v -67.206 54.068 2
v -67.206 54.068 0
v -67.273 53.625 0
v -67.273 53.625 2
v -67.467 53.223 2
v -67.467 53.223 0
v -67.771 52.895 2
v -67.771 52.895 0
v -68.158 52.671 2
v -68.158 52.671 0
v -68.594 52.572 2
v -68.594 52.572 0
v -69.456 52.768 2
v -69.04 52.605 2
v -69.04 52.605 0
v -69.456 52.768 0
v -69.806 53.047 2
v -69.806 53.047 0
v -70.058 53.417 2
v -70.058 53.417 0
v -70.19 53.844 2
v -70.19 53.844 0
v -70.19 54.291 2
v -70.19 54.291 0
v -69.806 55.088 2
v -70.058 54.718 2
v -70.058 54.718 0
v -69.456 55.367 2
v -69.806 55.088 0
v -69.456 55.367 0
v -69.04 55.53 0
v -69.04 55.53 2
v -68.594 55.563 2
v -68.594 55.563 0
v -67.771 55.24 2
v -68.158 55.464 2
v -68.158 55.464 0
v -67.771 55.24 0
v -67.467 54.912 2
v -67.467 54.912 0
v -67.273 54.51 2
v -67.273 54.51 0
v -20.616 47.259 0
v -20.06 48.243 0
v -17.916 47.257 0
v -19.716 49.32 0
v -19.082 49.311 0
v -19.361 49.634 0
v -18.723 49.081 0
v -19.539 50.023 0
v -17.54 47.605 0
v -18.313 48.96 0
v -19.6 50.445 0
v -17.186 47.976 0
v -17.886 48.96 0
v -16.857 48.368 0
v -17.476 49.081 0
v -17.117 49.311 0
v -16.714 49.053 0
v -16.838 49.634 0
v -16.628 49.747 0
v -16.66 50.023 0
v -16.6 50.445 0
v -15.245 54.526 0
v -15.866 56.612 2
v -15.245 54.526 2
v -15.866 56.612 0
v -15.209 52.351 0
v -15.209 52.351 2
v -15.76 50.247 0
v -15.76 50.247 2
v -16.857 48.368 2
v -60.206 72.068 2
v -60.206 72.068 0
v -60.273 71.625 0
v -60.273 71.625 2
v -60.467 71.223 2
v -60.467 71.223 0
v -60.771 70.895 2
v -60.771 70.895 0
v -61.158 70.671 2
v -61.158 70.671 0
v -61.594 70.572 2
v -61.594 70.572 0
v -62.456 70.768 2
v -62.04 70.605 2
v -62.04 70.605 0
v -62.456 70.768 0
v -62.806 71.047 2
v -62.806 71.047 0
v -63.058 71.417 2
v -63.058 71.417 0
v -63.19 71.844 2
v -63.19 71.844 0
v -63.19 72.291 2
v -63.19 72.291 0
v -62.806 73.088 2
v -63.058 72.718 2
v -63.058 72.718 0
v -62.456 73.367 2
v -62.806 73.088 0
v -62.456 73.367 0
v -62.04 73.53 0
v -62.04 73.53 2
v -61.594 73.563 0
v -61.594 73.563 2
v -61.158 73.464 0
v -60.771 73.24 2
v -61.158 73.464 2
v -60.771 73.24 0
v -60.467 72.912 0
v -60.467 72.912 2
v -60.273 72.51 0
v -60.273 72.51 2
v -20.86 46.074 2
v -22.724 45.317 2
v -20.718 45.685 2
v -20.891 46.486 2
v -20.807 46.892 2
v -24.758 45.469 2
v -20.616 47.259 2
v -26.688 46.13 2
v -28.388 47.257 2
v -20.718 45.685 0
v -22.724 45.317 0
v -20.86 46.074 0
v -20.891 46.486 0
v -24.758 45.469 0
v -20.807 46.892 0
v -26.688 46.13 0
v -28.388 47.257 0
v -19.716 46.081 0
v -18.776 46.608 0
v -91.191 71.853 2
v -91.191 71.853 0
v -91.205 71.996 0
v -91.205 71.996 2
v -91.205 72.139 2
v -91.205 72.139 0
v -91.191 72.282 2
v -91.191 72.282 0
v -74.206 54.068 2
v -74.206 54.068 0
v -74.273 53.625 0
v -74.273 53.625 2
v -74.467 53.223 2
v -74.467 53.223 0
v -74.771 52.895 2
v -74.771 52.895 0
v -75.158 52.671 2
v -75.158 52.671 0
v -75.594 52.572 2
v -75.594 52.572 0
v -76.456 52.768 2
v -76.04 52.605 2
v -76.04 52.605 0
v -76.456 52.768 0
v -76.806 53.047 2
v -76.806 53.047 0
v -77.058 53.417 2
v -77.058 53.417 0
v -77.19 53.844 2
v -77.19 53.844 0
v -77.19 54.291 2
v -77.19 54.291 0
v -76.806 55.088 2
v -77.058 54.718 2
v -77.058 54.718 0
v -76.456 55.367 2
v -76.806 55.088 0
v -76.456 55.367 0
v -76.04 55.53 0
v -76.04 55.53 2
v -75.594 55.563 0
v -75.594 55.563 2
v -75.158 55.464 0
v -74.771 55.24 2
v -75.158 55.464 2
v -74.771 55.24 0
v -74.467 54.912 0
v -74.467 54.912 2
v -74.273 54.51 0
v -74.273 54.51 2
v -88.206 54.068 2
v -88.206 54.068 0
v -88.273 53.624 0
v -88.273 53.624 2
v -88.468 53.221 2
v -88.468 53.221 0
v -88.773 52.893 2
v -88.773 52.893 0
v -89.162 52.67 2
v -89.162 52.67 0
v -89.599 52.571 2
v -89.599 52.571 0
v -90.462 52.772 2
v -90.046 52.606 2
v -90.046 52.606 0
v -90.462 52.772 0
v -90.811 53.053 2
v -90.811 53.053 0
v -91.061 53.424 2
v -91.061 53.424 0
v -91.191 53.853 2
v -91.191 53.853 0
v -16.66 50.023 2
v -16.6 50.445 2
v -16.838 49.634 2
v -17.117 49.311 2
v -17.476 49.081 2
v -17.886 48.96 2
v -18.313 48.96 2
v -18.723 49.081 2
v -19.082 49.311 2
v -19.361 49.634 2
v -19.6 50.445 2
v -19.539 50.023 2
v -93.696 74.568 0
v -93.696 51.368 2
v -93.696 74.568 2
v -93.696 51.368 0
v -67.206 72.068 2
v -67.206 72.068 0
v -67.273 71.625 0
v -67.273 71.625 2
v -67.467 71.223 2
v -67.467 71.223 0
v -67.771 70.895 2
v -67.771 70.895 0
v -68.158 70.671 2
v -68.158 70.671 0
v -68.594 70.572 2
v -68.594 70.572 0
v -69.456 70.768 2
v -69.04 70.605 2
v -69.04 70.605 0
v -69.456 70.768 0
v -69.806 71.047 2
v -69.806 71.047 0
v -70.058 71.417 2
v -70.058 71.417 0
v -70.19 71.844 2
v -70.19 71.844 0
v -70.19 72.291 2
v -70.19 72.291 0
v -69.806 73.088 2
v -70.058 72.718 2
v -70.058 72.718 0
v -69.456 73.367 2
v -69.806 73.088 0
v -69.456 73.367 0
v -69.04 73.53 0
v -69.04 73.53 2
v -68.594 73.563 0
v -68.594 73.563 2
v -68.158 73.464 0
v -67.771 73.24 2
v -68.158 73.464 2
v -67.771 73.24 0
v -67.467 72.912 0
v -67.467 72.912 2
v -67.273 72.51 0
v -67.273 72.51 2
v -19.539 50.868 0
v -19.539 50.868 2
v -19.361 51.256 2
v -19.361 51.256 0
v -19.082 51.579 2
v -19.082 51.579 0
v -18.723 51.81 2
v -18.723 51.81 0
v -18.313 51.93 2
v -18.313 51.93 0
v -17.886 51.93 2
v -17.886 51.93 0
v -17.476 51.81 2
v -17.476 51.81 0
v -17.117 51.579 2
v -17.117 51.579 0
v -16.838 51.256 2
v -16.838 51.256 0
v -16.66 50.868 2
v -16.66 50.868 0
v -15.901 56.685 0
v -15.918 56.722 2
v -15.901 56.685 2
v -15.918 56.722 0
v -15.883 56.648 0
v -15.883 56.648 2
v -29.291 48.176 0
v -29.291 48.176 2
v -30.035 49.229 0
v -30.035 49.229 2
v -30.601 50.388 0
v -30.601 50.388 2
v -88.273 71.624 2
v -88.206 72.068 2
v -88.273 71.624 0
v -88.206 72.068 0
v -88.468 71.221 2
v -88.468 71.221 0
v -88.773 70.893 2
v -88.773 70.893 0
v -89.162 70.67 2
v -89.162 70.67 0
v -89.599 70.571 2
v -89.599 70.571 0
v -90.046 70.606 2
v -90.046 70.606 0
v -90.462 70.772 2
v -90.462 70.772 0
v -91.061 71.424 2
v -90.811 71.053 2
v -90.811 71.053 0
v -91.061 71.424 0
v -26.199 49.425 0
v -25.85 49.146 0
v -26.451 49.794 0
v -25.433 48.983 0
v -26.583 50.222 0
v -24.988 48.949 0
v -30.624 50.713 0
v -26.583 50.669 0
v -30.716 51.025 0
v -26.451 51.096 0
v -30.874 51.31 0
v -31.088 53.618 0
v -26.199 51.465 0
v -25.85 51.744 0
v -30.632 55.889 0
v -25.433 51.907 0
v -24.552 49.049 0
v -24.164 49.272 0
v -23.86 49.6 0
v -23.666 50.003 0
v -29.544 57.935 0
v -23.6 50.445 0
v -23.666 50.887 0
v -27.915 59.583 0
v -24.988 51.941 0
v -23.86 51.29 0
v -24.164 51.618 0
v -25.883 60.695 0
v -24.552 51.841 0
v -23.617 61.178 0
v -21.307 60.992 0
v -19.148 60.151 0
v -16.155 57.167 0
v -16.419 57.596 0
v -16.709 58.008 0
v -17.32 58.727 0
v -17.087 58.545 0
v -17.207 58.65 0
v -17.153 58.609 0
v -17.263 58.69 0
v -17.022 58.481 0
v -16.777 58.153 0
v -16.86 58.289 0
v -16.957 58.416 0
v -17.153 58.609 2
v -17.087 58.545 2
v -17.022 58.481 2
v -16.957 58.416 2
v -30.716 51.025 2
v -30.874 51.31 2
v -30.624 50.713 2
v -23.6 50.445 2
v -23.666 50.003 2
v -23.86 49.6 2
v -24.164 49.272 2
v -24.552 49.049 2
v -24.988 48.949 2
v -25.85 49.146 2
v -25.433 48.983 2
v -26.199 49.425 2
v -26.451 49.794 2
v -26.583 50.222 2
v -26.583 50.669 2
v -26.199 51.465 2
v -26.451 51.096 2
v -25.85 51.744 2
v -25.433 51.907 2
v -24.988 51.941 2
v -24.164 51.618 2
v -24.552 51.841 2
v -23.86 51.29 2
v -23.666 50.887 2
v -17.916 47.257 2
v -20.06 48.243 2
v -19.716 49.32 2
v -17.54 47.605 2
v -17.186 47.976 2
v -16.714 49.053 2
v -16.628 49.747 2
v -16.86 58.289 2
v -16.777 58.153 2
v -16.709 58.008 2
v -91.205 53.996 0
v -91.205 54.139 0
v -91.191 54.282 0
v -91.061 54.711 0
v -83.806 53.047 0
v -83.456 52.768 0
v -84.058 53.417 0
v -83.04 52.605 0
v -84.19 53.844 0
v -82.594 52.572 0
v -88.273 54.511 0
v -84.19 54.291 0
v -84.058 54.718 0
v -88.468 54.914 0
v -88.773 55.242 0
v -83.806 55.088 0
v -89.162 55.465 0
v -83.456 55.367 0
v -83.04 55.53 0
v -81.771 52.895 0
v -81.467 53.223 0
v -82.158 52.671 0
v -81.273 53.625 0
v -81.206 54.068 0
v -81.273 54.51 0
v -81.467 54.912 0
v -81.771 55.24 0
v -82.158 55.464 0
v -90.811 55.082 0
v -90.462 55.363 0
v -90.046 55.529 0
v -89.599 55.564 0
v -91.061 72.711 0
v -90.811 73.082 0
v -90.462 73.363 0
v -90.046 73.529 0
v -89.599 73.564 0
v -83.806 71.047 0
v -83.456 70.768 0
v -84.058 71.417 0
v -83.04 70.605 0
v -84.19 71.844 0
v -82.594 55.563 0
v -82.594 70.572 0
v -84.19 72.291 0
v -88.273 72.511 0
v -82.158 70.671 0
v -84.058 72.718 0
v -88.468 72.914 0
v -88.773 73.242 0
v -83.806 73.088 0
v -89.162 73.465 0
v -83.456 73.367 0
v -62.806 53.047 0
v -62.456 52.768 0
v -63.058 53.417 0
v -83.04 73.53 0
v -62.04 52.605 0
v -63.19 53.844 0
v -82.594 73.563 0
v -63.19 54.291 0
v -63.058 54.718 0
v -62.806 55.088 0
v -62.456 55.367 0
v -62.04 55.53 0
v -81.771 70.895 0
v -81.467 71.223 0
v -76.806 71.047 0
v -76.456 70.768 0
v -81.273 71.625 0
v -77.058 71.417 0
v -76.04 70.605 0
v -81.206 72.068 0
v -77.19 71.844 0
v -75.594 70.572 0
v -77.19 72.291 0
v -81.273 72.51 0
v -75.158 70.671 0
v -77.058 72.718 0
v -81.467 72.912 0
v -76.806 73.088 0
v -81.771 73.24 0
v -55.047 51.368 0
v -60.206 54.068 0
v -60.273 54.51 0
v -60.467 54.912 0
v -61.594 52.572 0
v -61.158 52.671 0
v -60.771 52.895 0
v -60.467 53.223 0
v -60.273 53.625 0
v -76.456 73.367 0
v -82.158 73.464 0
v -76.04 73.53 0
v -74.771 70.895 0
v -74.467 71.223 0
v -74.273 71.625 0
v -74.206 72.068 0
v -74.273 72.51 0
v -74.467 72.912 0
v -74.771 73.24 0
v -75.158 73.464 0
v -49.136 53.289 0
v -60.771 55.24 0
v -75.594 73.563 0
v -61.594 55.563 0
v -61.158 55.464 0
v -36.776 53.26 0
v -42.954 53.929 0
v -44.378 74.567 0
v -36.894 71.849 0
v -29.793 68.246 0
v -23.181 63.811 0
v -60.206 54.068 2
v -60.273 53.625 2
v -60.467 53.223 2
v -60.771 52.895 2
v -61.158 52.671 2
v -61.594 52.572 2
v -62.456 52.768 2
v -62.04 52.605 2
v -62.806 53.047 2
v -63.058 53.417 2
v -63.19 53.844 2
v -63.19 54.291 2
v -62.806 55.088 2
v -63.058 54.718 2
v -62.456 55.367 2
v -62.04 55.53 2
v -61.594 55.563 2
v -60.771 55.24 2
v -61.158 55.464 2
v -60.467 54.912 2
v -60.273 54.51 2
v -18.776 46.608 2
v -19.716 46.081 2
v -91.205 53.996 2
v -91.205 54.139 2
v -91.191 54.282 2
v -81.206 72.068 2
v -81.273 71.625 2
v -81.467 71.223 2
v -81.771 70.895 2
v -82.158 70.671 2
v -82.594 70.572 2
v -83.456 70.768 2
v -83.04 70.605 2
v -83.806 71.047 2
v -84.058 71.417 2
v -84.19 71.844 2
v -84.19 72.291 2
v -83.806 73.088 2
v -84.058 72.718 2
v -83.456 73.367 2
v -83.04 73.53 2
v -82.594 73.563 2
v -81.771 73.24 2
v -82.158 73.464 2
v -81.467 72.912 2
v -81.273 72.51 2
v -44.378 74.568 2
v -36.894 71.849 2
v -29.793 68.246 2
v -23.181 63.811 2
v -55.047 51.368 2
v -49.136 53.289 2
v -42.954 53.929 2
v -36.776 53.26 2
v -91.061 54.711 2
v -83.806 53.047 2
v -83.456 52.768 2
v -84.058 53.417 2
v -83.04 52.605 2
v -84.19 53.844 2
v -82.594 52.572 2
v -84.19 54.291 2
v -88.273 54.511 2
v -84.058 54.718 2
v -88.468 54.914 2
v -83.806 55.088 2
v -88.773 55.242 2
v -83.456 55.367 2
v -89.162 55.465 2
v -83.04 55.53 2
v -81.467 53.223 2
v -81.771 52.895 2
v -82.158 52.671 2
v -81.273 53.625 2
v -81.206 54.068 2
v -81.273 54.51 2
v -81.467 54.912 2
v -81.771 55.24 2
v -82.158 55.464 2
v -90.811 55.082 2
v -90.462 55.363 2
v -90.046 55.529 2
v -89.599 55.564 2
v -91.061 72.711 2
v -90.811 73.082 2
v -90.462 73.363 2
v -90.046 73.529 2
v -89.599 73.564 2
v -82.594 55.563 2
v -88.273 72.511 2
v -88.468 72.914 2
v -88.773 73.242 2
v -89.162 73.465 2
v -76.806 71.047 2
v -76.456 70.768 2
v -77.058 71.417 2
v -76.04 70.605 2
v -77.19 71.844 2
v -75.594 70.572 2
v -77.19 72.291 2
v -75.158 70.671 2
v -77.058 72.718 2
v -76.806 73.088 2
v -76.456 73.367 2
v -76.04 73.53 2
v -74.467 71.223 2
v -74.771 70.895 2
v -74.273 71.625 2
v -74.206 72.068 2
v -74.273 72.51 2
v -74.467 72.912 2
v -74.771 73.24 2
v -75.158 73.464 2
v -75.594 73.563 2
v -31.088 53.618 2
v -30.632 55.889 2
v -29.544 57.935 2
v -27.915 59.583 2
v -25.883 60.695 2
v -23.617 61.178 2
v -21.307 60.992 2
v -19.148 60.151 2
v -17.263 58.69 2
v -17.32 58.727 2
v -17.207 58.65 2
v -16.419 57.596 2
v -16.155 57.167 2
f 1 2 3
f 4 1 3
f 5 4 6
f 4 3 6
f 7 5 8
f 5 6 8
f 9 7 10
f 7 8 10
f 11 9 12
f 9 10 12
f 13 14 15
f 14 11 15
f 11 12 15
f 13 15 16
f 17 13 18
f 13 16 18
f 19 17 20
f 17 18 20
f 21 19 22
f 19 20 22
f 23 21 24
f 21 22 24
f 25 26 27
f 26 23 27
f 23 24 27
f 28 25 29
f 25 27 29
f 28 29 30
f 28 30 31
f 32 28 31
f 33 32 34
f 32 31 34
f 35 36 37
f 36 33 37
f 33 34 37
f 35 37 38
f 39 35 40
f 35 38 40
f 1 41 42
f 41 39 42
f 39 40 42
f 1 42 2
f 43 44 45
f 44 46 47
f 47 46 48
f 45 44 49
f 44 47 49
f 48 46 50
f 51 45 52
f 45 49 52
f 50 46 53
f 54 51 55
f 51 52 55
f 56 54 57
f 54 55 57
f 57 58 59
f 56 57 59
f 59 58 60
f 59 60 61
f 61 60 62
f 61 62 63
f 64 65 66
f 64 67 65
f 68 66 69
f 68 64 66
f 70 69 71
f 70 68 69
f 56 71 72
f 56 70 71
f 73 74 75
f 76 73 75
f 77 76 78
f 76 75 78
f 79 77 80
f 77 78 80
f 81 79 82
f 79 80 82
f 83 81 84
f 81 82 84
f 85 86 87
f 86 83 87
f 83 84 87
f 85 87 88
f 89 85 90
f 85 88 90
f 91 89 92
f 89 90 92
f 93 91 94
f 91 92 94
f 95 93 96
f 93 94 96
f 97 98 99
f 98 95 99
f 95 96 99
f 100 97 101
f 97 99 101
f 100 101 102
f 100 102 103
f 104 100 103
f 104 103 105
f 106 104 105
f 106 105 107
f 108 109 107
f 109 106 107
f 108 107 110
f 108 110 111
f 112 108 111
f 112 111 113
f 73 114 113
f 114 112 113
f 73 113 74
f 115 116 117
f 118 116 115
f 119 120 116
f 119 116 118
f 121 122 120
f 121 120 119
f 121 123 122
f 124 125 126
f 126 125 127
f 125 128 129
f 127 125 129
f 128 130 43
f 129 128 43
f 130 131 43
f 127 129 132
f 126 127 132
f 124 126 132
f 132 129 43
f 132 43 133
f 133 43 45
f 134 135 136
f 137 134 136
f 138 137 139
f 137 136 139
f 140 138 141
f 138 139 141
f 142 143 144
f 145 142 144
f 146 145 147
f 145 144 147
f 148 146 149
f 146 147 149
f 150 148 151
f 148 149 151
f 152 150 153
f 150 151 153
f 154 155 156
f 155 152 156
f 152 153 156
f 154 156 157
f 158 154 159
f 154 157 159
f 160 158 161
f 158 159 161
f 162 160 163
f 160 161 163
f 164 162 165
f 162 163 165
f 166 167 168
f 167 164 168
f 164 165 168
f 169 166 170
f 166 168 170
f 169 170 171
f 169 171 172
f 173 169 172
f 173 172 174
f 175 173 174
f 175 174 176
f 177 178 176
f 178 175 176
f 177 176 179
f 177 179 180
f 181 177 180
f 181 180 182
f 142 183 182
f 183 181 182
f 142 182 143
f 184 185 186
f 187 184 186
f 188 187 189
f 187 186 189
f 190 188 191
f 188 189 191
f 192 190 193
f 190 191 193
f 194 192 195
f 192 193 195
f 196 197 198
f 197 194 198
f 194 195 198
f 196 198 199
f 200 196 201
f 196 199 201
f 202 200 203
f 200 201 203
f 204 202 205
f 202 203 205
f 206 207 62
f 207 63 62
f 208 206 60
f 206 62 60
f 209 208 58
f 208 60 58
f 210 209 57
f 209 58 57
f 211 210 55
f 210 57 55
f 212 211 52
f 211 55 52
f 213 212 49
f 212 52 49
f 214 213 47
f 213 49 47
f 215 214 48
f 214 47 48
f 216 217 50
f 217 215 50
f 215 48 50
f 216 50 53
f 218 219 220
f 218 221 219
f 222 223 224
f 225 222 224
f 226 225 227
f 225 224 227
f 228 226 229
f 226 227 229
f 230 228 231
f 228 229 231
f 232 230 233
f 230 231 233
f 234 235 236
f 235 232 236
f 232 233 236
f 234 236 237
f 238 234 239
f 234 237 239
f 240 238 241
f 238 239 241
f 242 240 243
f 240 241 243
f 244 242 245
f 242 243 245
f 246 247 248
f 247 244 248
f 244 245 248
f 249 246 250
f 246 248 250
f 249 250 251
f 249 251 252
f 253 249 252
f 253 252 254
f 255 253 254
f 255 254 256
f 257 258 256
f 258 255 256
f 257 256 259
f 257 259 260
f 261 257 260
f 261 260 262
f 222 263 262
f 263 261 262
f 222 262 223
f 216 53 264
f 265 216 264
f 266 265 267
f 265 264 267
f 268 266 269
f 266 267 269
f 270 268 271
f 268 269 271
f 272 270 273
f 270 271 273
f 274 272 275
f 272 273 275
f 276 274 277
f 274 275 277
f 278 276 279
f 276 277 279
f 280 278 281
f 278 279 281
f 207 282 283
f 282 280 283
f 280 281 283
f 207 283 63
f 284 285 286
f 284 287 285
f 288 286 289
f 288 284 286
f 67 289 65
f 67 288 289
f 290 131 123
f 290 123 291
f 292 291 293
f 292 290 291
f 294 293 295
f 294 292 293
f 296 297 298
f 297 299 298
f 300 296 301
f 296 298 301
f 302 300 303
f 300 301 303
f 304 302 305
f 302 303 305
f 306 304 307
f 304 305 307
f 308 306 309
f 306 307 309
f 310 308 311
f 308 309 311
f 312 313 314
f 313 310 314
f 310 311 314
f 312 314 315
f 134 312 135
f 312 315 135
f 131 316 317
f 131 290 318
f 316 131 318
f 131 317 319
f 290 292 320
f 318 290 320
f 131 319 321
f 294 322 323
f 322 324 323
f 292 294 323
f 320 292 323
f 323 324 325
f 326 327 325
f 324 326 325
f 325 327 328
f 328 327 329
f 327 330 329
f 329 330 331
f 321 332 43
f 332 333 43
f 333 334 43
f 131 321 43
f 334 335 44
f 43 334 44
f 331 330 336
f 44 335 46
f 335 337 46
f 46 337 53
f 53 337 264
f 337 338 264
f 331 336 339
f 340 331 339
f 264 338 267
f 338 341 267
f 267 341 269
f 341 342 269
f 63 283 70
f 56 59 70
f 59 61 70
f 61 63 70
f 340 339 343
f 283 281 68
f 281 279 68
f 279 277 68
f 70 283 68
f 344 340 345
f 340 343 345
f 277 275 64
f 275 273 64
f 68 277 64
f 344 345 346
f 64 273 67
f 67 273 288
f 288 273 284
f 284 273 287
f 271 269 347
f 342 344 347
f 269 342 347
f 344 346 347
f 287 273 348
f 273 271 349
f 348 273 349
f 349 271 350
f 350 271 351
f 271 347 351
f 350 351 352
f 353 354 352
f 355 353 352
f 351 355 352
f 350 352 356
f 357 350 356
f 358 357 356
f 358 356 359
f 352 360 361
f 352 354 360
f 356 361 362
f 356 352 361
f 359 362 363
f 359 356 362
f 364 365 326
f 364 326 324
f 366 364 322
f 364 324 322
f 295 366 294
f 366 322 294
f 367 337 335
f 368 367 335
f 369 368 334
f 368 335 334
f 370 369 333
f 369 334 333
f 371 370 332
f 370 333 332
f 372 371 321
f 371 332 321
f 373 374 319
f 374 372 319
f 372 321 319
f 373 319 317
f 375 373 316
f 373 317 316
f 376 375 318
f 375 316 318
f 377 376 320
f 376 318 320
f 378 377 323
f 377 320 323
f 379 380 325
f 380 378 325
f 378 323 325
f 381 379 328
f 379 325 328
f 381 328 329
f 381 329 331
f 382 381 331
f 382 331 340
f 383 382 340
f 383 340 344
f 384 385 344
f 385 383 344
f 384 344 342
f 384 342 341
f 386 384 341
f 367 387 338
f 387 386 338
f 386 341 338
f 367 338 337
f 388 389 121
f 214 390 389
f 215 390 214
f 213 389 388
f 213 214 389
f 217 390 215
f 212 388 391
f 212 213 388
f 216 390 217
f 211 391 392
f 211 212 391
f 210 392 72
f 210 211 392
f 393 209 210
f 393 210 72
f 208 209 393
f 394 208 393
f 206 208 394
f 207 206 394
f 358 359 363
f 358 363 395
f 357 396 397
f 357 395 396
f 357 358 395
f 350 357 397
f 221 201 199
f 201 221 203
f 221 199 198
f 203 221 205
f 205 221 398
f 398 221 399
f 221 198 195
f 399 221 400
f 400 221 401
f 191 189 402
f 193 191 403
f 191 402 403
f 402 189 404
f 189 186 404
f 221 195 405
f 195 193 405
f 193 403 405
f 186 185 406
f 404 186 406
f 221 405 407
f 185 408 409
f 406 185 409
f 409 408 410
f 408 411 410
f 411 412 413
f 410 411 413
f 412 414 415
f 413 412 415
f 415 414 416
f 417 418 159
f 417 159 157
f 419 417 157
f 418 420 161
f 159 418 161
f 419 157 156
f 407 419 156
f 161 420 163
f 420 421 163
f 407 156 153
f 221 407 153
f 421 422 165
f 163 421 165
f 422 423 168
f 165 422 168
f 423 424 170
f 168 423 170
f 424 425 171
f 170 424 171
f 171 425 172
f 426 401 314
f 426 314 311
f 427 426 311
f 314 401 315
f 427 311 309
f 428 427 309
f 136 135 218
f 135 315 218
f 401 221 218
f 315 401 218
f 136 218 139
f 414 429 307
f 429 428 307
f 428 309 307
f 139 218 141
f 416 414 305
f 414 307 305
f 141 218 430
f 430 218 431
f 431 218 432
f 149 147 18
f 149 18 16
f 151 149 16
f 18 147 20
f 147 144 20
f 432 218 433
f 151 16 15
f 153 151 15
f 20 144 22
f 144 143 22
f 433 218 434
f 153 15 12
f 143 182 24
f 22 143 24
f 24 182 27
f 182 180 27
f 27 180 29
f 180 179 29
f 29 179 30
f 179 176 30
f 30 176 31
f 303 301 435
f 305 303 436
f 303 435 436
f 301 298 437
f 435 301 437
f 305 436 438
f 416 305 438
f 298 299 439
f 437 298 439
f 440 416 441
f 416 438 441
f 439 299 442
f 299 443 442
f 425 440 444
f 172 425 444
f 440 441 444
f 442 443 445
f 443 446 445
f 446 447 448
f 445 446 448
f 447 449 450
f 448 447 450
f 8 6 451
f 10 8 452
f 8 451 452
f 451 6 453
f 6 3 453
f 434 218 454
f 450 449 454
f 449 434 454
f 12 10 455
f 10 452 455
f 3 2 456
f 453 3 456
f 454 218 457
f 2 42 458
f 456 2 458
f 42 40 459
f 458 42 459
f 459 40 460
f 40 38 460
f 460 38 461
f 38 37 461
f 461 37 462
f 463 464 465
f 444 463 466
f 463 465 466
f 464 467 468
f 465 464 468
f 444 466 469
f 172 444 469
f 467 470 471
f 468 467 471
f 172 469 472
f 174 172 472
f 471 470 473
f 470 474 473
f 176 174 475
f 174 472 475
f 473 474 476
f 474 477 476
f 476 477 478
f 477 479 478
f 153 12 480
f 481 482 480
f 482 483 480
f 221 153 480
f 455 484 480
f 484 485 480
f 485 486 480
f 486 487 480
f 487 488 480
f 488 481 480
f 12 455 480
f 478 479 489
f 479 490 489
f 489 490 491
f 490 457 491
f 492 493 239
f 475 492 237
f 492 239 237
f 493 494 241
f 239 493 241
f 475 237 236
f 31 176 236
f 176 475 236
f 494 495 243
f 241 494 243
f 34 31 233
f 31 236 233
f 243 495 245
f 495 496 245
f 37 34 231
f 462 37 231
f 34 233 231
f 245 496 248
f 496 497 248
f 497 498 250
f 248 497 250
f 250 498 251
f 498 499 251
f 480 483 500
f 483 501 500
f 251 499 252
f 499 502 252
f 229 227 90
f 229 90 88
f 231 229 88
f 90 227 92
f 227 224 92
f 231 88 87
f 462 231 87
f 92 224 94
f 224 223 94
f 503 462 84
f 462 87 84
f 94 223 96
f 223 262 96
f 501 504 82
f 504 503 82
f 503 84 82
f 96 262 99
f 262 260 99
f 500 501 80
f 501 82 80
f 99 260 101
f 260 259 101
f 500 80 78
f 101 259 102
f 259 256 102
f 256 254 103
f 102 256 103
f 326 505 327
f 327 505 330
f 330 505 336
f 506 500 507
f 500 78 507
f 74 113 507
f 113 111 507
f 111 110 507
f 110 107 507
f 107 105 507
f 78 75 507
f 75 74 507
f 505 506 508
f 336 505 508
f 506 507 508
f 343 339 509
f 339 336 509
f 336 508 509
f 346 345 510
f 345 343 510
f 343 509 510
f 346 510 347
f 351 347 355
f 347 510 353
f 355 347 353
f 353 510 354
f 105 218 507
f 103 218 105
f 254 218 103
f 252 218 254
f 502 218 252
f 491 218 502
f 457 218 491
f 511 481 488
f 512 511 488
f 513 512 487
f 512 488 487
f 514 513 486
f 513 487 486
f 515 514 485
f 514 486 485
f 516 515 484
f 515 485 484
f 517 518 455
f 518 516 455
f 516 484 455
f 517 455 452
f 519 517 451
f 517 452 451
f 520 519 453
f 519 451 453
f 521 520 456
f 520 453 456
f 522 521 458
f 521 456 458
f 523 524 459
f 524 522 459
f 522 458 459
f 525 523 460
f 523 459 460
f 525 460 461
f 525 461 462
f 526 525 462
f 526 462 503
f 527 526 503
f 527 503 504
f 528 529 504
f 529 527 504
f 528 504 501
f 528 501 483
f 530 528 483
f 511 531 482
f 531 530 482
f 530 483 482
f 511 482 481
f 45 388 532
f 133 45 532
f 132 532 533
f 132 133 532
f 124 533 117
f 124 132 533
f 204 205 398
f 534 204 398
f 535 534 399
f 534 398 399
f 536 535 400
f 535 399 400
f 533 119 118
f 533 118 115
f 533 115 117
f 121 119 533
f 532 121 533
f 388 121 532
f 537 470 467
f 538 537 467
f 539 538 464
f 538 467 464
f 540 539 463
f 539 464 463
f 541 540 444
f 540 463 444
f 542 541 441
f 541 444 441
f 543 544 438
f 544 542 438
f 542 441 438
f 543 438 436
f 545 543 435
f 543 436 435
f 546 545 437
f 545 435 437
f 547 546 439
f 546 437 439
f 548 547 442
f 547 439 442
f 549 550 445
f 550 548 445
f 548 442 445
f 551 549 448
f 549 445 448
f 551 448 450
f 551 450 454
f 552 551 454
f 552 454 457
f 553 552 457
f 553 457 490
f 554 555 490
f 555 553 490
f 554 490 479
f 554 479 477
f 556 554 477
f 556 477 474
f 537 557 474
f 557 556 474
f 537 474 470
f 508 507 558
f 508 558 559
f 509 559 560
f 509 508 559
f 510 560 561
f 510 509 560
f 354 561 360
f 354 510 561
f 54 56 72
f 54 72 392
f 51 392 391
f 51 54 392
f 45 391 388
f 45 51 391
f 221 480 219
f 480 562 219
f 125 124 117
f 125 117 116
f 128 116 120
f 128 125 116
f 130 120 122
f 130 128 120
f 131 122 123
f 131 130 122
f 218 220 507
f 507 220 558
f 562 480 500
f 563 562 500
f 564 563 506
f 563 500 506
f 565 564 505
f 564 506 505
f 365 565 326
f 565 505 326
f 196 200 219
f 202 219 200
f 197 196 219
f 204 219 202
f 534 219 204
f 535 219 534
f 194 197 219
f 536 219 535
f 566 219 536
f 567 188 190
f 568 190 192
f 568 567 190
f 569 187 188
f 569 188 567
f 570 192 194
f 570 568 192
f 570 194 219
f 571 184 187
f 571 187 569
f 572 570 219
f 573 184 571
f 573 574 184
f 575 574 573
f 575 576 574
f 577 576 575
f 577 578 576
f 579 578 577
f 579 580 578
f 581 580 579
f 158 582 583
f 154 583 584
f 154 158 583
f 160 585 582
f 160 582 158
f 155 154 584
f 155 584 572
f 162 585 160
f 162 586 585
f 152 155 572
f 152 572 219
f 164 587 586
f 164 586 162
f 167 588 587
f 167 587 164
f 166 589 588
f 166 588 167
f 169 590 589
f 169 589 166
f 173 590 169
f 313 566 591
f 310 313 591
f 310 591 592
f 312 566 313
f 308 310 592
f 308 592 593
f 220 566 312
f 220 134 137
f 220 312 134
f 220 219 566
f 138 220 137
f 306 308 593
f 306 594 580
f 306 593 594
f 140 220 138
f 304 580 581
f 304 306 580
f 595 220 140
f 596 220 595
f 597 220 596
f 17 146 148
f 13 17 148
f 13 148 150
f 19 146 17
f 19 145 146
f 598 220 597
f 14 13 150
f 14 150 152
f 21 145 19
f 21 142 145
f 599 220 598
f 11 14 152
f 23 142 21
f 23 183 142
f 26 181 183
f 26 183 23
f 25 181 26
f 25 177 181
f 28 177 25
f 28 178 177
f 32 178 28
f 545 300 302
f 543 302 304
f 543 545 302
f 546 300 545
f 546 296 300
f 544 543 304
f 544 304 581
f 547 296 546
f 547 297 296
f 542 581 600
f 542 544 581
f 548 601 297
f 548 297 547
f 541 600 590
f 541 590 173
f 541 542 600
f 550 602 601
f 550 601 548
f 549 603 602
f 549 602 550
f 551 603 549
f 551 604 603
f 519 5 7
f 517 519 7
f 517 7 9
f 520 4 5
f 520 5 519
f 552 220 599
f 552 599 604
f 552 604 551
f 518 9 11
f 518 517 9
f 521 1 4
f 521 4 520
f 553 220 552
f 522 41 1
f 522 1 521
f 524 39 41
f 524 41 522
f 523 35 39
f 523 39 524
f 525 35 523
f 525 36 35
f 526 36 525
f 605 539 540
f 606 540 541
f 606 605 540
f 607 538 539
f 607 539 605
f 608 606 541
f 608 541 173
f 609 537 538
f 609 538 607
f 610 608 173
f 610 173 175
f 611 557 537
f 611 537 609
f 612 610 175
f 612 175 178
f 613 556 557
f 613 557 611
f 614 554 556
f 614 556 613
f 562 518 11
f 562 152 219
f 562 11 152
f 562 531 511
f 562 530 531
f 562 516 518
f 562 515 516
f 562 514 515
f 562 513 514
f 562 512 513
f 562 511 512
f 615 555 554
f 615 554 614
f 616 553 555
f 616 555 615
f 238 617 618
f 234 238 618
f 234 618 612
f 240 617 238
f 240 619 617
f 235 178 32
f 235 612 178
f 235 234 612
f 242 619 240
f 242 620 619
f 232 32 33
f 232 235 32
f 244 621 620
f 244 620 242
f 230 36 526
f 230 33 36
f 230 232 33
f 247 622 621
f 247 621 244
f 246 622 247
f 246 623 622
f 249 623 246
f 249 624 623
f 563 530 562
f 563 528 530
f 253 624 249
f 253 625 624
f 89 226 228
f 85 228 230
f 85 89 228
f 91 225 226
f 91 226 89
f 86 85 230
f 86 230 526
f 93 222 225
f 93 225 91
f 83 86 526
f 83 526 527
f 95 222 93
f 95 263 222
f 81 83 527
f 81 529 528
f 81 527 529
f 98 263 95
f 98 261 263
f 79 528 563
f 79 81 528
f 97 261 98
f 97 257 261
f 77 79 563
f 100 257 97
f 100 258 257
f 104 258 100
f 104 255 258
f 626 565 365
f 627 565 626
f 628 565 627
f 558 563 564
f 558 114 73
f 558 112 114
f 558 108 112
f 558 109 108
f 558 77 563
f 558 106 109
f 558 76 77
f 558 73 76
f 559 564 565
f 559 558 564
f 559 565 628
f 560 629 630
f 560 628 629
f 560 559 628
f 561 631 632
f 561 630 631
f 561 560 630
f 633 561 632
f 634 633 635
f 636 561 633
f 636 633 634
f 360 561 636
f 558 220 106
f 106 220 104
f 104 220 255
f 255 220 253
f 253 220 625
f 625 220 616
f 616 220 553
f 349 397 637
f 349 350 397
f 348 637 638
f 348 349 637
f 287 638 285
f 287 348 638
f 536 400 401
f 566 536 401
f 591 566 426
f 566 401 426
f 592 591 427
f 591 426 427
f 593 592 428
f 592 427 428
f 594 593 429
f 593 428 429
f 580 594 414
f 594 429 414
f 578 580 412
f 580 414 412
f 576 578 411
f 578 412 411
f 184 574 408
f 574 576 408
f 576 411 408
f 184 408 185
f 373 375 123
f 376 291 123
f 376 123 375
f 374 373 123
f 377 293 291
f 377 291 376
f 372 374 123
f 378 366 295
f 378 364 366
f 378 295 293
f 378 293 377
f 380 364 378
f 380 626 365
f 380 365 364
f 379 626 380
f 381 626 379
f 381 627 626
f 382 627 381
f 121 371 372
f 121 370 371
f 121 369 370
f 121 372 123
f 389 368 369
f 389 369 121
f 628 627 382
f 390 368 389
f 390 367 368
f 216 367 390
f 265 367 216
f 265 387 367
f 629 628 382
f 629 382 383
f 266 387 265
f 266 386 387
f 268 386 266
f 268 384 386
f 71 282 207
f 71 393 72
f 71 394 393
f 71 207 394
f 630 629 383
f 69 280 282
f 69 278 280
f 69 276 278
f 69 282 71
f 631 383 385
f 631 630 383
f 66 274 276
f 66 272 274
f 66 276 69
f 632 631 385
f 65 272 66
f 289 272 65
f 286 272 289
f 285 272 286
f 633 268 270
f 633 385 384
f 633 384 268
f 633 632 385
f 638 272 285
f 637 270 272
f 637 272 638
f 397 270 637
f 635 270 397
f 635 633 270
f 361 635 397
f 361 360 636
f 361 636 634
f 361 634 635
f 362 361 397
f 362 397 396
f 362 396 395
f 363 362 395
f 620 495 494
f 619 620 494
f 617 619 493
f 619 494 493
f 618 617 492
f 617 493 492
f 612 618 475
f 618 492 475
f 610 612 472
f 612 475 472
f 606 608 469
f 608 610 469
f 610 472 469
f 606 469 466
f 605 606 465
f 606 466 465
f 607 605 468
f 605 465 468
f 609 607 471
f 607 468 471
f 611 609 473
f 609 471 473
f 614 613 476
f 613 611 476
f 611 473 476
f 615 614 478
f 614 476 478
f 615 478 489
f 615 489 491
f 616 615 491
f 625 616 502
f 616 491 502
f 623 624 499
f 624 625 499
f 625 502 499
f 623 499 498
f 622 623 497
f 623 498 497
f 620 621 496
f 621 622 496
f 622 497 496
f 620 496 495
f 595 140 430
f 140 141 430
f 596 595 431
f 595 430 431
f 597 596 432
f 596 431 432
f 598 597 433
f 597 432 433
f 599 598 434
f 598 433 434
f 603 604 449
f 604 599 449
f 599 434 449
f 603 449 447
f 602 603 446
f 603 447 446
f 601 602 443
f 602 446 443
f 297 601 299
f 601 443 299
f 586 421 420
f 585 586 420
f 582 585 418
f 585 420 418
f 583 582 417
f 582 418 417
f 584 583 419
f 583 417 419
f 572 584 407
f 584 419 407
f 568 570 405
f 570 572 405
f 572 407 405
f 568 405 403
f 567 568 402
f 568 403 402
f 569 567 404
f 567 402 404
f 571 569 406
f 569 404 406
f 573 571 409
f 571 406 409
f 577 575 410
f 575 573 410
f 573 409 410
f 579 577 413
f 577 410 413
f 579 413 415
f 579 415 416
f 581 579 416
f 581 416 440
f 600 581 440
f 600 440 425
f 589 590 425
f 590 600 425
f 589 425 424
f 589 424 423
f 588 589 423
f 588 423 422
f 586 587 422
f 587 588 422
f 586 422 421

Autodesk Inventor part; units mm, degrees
ref_plane "YZ Plane" through (0, 0, 0) normal (1, 0, 0) x (0, 1, 0)
ref_plane "XZ Plane" through (0, 0, 0) normal (0, 1, 0) x (-1, 0, 0)
ref_plane "XY Plane" through (0, 0, 0) normal (0, 0, 1) x (1, 0, 0)
ref_plane "РабПлоскость1" through (0, 0, 0) normal (0, 0, 1) x (1, 0, 0)
sketch "Эскиз1" plane through (0, 0, 0) normal (0, 0, 1) x (1, 0, 0)
  line L0 (-3.6964, 47.257) -> (-93.6964, 47.257)
  line L1 (-93.6964, 47.257) -> (-93.6964, 77.257)
  line L2 (-93.6964, 77.257) -> (-3.6964, 77.257)
  line L3 (-3.6964, 77.257) -> (-3.6964, 47.257)
  circle A0 centre (-25.0996, 50.4451) radius 1.5 projected
  circle A1 centre (-61.7063, 54.0675) radius 1.5
  circle A2 centre (-68.7063, 54.0675) radius 1.5
  circle A3 centre (-75.7063, 54.0675) radius 1.5
  circle A4 centre (-82.7063, 54.0675) radius 1.5
  circle A5 centre (-89.7063, 54.0675) radius 1.5
  circle A6 centre (-61.7063, 72.0675) radius 1.5
  circle A7 centre (-68.7063, 72.0675) radius 1.5
  circle A8 centre (-75.7063, 72.0675) radius 1.5
  circle A9 centre (-82.7063, 72.0675) radius 1.5
  circle A10 centre (-89.7063, 72.0675) radius 1.5
  circle A11 centre (-5.0903, 22.9004) radius 1.5 projected
  circle A12 centre (-13.6314, 40.9849) radius 1.5 projected
  circle A13 centre (-0.8198, 13.8581) radius 1.5 projected
  circle A14 centre (3.4507, 4.8159) radius 1.5 projected
  circle A15 centre (11.9918, -13.2686) radius 1.5 projected
  circle A16 centre (-9.3609, 31.9427) radius 1.5 projected
  circle A17 centre (16.2623, -22.3109) radius 1.5 projected
  circle A18 centre (-9.4594, 1.6491) radius 1.5 projected
  circle A19 centre (-3.3563, -17.3969) radius 1.5 projected
  circle A20 centre (-18.6141, 30.2182) radius 1.5 projected
  circle A21 centre (-12.511, 11.1722) radius 1.5 projected
  circle A22 centre (-15.5626, 20.6952) radius 1.5 projected
  circle A23 centre (-21.6657, 39.7412) radius 1.5 projected
  circle A24 centre (-6.4079, -7.8739) radius 1.5 projected
  circle A25 centre (-0.3048, -26.9199) radius 1.5 projected
  arc A26 (1.815, -50.7724) -> (29.663, -39.7893) centre (16.0996, -46.1951) ccw projected
  line L4 (29.663, -39.7893) -> (-15.8657, 56.6115) projected
  arc A27 (-15.8657, 56.6115) -> (-16.7091, 58.0078) centre (-23.0996, 53.1951) ccw projected
  arc A28 (-16.7091, 58.0078) -> (-17.3202, 58.7267) centre (-18.0996, 57.4451) ccw projected
  arc A29 (-17.3202, 58.7267) -> (-30.8744, 51.3105) centre (-23.0996, 53.1951) ccw projected
  arc A30 (-30.6007, 50.3877) -> (-30.8744, 51.3105) centre (-32.0996, 50.4451) ccw projected
  line L5 (-30.6007, 50.3877) -> (1.815, -50.7724) projected
  circle A31 centre (25.6634, -44.4774) radius 1.5 projected
  circle A32 centre (5.6634, -44.4774) radius 1.5 projected
  circle A33 centre (-25.0996, 50.4451) radius 1.5 projected
  arc A34 (-16.9566, 58.4165) -> (-61.7063, 77.257) centre (-63.0326, 11.5423) ccw
  arc A35 (-30.8744, 51.3105) -> (-61.7063, 47.257) centre (-43.024, 24.4392) ccw
  arc A36 (-30.6007, 50.3877) -> (-15.918, 56.7222) centre (-23.1518, 53.3058) ccw
  arc A37 (-16.5996, 50.4451) -> (-19.5996, 50.4451) centre (-18.0996, 50.4451) ccw projected
  arc A38 (-18.1711, 45.521) -> (-16.5996, 50.4451) centre (-25.0996, 50.4451) ccw projected
  arc A39 (-20.6164, 47.2589) -> (-18.1711, 45.521) centre (-19.3937, 46.39) ccw projected
  arc A40 (-20.6164, 47.2589) -> (-19.5996, 50.4451) centre (-25.0996, 50.4451) ccw projected
  arc A41 (-16.5996, 50.4451) -> (-19.5996, 50.4451) centre (-18.0996, 50.4451) ccw projected
  arc A42 (6.296, -11.0397) -> (4.5608, -0.7256) centre (-6.4079, -7.8739) ccw projected
  arc A43 (7.0742, 0.9124) -> (4.5608, -0.7256) centre (5.8175, 0.0934) ccw projected
  arc A44 (9.207, -11.7651) -> (7.0742, 0.9124) centre (-6.4079, -7.8739) ccw projected
  arc A45 (6.296, -11.0397) -> (9.207, -11.7651) centre (7.7515, -11.4024) ccw projected
  circle A46 centre (-18.0996, 50.4451) radius 1.5
  point P0 (0, 0)
  point P1 (-15.8921, 56.6667)
  point P2 (-19.5996, 50.4451)
  dimension "d0" = 90
  dimension "d1" = 30
  dimension "d2" = 3
  dimension "d5" = 7
  dimension "d8" = 18
extrude "Выдавливание1" add sketch "Эскиз1" along normal blind 2 contours L0 L1 L2 A34 A28 A29 A35 | A29 A28 A34 A27 A36 A38 A37 A40 L0 A30 | L0 A39 A36 | A40 A46 A38 A36 L0 | L0 A36 A39
sketch "Эскиз2" plane through (0, 0, 2) normal (0, 0, 1) x (1, 0, 0)
  line L0 (-83.9909, 70.7175) -> (-91.1909, 70.7175) projected
  line L1 (-91.1909, 70.7175) -> (-91.1909, 74.5675) projected
  line L2 (-91.1909, 74.5675) -> (-50.1909, 74.5675) projected
  line L3 (-50.1909, 74.5675) -> (-50.1909, 72.0675) projected
  line L4 (-50.1909, 72.0675) -> (-58.3909, 72.0675) projected
  line L5 (-58.3909, 72.0675) -> (-58.3909, 54.0675) projected
  line L6 (-58.3909, 54.0675) -> (-50.1909, 54.0675) projected
  line L7 (-50.1909, 54.0675) -> (-50.1909, 51.3675) projected
  line L8 (-50.1909, 51.3675) -> (-91.1909, 51.3675) projected
  line L9 (-91.1909, 51.3675) -> (-91.1909, 55.2175) projected
  line L10 (-91.1909, 55.2175) -> (-83.9909, 55.2175) projected
  line L11 (-83.9909, 55.2175) -> (-83.9909, 70.7175) projected
  circle A0 centre (-82.7063, 72.0675) radius 1.5 projected
  circle A1 centre (-61.7063, 54.0675) radius 1.5 projected
  circle A2 centre (-61.7063, 72.0675) radius 1.5 projected
  circle A3 centre (-82.7063, 54.0675) radius 1.5 projected
  arc A4 (-15.8921, 56.6667) -> (-16.7091, 58.0078) centre (-23.0996, 53.1951) ccw projected
  arc A5 (-16.7091, 58.0078) -> (-16.9566, 58.4165) centre (-18.0996, 57.4451) ccw projected
  arc A6 (-16.9566, 58.4165) -> (-61.7063, 77.257) centre (-63.0326, 11.5423) ccw projected
  line L12 (-61.7063, 77.257) -> (-93.6964, 77.257) projected
  line L13 (-93.6964, 77.257) -> (-93.6964, 47.257) projected
  line L14 (-93.6964, 47.257) -> (-61.7063, 47.257) projected
  arc A7 (-30.8744, 51.3105) -> (-61.7063, 47.257) centre (-43.024, 24.4392) ccw projected
  arc A8 (-30.6007, 50.3877) -> (-30.8744, 51.3105) centre (-32.0996, 50.4451) ccw projected
  arc A9 (-30.6007, 50.3877) -> (-15.8921, 56.6667) centre (-23.1518, 53.3058) ccw projected
  circle A10 centre (-61.7063, 54.0675) radius 1.5 projected
  circle A11 centre (-61.7063, 72.0675) radius 1.5 projected
  circle A12 centre (-82.7063, 72.0675) radius 1.5 projected
  circle A13 centre (-68.7063, 72.0675) radius 1.5 projected
  circle A14 centre (-68.7063, 54.0675) radius 1.5 projected
  circle A15 centre (-75.7063, 54.0675) radius 1.5 projected
  circle A16 centre (-82.7063, 54.0675) radius 1.5 projected
  circle A17 centre (-89.7063, 54.0675) radius 1.5 projected
  circle A18 centre (-75.7063, 72.0675) radius 1.5 projected
  circle A19 centre (-89.7063, 72.0675) radius 1.5 projected
  circle A20 centre (-25.0996, 50.4451) radius 1.5 projected
  line L15 (-93.6964, 77.257) -> (-93.6964, 47.257) projected
  line L16 (-91.1909, 51.3675) -> (-93.6964, 51.3675)
  line L17 (-93.6964, 51.3675) -> (-93.6964, 74.5675)
  line L18 (-93.6964, 74.5675) -> (-91.1909, 74.5675)
  line L19 (-91.1909, 74.5675) -> (-91.1909, 51.3675)
  line L20 (-50.1909, 74.5675) -> (-44.3775, 74.5675)
  point P0 (0, 0)
  point P1 (-91.1909, 54.2816)
  point P2 (-91.1909, 53.8534)
  point P3 (-91.1909, 72.2816)
  point P4 (-91.1909, 71.8534)
  point P5 (-55.0469, 51.3675)
extrude "Выдавливание2" cut sketch "Эскиз2" against normal blind 3 contours A19 L1 | L18 L13 L12 A6 L20 L2 | L9 A17 | L8 A7 L14 L13 L16
properties part number "ЛЦМК000002.00.00.00.00.20 Платформа экрана"
